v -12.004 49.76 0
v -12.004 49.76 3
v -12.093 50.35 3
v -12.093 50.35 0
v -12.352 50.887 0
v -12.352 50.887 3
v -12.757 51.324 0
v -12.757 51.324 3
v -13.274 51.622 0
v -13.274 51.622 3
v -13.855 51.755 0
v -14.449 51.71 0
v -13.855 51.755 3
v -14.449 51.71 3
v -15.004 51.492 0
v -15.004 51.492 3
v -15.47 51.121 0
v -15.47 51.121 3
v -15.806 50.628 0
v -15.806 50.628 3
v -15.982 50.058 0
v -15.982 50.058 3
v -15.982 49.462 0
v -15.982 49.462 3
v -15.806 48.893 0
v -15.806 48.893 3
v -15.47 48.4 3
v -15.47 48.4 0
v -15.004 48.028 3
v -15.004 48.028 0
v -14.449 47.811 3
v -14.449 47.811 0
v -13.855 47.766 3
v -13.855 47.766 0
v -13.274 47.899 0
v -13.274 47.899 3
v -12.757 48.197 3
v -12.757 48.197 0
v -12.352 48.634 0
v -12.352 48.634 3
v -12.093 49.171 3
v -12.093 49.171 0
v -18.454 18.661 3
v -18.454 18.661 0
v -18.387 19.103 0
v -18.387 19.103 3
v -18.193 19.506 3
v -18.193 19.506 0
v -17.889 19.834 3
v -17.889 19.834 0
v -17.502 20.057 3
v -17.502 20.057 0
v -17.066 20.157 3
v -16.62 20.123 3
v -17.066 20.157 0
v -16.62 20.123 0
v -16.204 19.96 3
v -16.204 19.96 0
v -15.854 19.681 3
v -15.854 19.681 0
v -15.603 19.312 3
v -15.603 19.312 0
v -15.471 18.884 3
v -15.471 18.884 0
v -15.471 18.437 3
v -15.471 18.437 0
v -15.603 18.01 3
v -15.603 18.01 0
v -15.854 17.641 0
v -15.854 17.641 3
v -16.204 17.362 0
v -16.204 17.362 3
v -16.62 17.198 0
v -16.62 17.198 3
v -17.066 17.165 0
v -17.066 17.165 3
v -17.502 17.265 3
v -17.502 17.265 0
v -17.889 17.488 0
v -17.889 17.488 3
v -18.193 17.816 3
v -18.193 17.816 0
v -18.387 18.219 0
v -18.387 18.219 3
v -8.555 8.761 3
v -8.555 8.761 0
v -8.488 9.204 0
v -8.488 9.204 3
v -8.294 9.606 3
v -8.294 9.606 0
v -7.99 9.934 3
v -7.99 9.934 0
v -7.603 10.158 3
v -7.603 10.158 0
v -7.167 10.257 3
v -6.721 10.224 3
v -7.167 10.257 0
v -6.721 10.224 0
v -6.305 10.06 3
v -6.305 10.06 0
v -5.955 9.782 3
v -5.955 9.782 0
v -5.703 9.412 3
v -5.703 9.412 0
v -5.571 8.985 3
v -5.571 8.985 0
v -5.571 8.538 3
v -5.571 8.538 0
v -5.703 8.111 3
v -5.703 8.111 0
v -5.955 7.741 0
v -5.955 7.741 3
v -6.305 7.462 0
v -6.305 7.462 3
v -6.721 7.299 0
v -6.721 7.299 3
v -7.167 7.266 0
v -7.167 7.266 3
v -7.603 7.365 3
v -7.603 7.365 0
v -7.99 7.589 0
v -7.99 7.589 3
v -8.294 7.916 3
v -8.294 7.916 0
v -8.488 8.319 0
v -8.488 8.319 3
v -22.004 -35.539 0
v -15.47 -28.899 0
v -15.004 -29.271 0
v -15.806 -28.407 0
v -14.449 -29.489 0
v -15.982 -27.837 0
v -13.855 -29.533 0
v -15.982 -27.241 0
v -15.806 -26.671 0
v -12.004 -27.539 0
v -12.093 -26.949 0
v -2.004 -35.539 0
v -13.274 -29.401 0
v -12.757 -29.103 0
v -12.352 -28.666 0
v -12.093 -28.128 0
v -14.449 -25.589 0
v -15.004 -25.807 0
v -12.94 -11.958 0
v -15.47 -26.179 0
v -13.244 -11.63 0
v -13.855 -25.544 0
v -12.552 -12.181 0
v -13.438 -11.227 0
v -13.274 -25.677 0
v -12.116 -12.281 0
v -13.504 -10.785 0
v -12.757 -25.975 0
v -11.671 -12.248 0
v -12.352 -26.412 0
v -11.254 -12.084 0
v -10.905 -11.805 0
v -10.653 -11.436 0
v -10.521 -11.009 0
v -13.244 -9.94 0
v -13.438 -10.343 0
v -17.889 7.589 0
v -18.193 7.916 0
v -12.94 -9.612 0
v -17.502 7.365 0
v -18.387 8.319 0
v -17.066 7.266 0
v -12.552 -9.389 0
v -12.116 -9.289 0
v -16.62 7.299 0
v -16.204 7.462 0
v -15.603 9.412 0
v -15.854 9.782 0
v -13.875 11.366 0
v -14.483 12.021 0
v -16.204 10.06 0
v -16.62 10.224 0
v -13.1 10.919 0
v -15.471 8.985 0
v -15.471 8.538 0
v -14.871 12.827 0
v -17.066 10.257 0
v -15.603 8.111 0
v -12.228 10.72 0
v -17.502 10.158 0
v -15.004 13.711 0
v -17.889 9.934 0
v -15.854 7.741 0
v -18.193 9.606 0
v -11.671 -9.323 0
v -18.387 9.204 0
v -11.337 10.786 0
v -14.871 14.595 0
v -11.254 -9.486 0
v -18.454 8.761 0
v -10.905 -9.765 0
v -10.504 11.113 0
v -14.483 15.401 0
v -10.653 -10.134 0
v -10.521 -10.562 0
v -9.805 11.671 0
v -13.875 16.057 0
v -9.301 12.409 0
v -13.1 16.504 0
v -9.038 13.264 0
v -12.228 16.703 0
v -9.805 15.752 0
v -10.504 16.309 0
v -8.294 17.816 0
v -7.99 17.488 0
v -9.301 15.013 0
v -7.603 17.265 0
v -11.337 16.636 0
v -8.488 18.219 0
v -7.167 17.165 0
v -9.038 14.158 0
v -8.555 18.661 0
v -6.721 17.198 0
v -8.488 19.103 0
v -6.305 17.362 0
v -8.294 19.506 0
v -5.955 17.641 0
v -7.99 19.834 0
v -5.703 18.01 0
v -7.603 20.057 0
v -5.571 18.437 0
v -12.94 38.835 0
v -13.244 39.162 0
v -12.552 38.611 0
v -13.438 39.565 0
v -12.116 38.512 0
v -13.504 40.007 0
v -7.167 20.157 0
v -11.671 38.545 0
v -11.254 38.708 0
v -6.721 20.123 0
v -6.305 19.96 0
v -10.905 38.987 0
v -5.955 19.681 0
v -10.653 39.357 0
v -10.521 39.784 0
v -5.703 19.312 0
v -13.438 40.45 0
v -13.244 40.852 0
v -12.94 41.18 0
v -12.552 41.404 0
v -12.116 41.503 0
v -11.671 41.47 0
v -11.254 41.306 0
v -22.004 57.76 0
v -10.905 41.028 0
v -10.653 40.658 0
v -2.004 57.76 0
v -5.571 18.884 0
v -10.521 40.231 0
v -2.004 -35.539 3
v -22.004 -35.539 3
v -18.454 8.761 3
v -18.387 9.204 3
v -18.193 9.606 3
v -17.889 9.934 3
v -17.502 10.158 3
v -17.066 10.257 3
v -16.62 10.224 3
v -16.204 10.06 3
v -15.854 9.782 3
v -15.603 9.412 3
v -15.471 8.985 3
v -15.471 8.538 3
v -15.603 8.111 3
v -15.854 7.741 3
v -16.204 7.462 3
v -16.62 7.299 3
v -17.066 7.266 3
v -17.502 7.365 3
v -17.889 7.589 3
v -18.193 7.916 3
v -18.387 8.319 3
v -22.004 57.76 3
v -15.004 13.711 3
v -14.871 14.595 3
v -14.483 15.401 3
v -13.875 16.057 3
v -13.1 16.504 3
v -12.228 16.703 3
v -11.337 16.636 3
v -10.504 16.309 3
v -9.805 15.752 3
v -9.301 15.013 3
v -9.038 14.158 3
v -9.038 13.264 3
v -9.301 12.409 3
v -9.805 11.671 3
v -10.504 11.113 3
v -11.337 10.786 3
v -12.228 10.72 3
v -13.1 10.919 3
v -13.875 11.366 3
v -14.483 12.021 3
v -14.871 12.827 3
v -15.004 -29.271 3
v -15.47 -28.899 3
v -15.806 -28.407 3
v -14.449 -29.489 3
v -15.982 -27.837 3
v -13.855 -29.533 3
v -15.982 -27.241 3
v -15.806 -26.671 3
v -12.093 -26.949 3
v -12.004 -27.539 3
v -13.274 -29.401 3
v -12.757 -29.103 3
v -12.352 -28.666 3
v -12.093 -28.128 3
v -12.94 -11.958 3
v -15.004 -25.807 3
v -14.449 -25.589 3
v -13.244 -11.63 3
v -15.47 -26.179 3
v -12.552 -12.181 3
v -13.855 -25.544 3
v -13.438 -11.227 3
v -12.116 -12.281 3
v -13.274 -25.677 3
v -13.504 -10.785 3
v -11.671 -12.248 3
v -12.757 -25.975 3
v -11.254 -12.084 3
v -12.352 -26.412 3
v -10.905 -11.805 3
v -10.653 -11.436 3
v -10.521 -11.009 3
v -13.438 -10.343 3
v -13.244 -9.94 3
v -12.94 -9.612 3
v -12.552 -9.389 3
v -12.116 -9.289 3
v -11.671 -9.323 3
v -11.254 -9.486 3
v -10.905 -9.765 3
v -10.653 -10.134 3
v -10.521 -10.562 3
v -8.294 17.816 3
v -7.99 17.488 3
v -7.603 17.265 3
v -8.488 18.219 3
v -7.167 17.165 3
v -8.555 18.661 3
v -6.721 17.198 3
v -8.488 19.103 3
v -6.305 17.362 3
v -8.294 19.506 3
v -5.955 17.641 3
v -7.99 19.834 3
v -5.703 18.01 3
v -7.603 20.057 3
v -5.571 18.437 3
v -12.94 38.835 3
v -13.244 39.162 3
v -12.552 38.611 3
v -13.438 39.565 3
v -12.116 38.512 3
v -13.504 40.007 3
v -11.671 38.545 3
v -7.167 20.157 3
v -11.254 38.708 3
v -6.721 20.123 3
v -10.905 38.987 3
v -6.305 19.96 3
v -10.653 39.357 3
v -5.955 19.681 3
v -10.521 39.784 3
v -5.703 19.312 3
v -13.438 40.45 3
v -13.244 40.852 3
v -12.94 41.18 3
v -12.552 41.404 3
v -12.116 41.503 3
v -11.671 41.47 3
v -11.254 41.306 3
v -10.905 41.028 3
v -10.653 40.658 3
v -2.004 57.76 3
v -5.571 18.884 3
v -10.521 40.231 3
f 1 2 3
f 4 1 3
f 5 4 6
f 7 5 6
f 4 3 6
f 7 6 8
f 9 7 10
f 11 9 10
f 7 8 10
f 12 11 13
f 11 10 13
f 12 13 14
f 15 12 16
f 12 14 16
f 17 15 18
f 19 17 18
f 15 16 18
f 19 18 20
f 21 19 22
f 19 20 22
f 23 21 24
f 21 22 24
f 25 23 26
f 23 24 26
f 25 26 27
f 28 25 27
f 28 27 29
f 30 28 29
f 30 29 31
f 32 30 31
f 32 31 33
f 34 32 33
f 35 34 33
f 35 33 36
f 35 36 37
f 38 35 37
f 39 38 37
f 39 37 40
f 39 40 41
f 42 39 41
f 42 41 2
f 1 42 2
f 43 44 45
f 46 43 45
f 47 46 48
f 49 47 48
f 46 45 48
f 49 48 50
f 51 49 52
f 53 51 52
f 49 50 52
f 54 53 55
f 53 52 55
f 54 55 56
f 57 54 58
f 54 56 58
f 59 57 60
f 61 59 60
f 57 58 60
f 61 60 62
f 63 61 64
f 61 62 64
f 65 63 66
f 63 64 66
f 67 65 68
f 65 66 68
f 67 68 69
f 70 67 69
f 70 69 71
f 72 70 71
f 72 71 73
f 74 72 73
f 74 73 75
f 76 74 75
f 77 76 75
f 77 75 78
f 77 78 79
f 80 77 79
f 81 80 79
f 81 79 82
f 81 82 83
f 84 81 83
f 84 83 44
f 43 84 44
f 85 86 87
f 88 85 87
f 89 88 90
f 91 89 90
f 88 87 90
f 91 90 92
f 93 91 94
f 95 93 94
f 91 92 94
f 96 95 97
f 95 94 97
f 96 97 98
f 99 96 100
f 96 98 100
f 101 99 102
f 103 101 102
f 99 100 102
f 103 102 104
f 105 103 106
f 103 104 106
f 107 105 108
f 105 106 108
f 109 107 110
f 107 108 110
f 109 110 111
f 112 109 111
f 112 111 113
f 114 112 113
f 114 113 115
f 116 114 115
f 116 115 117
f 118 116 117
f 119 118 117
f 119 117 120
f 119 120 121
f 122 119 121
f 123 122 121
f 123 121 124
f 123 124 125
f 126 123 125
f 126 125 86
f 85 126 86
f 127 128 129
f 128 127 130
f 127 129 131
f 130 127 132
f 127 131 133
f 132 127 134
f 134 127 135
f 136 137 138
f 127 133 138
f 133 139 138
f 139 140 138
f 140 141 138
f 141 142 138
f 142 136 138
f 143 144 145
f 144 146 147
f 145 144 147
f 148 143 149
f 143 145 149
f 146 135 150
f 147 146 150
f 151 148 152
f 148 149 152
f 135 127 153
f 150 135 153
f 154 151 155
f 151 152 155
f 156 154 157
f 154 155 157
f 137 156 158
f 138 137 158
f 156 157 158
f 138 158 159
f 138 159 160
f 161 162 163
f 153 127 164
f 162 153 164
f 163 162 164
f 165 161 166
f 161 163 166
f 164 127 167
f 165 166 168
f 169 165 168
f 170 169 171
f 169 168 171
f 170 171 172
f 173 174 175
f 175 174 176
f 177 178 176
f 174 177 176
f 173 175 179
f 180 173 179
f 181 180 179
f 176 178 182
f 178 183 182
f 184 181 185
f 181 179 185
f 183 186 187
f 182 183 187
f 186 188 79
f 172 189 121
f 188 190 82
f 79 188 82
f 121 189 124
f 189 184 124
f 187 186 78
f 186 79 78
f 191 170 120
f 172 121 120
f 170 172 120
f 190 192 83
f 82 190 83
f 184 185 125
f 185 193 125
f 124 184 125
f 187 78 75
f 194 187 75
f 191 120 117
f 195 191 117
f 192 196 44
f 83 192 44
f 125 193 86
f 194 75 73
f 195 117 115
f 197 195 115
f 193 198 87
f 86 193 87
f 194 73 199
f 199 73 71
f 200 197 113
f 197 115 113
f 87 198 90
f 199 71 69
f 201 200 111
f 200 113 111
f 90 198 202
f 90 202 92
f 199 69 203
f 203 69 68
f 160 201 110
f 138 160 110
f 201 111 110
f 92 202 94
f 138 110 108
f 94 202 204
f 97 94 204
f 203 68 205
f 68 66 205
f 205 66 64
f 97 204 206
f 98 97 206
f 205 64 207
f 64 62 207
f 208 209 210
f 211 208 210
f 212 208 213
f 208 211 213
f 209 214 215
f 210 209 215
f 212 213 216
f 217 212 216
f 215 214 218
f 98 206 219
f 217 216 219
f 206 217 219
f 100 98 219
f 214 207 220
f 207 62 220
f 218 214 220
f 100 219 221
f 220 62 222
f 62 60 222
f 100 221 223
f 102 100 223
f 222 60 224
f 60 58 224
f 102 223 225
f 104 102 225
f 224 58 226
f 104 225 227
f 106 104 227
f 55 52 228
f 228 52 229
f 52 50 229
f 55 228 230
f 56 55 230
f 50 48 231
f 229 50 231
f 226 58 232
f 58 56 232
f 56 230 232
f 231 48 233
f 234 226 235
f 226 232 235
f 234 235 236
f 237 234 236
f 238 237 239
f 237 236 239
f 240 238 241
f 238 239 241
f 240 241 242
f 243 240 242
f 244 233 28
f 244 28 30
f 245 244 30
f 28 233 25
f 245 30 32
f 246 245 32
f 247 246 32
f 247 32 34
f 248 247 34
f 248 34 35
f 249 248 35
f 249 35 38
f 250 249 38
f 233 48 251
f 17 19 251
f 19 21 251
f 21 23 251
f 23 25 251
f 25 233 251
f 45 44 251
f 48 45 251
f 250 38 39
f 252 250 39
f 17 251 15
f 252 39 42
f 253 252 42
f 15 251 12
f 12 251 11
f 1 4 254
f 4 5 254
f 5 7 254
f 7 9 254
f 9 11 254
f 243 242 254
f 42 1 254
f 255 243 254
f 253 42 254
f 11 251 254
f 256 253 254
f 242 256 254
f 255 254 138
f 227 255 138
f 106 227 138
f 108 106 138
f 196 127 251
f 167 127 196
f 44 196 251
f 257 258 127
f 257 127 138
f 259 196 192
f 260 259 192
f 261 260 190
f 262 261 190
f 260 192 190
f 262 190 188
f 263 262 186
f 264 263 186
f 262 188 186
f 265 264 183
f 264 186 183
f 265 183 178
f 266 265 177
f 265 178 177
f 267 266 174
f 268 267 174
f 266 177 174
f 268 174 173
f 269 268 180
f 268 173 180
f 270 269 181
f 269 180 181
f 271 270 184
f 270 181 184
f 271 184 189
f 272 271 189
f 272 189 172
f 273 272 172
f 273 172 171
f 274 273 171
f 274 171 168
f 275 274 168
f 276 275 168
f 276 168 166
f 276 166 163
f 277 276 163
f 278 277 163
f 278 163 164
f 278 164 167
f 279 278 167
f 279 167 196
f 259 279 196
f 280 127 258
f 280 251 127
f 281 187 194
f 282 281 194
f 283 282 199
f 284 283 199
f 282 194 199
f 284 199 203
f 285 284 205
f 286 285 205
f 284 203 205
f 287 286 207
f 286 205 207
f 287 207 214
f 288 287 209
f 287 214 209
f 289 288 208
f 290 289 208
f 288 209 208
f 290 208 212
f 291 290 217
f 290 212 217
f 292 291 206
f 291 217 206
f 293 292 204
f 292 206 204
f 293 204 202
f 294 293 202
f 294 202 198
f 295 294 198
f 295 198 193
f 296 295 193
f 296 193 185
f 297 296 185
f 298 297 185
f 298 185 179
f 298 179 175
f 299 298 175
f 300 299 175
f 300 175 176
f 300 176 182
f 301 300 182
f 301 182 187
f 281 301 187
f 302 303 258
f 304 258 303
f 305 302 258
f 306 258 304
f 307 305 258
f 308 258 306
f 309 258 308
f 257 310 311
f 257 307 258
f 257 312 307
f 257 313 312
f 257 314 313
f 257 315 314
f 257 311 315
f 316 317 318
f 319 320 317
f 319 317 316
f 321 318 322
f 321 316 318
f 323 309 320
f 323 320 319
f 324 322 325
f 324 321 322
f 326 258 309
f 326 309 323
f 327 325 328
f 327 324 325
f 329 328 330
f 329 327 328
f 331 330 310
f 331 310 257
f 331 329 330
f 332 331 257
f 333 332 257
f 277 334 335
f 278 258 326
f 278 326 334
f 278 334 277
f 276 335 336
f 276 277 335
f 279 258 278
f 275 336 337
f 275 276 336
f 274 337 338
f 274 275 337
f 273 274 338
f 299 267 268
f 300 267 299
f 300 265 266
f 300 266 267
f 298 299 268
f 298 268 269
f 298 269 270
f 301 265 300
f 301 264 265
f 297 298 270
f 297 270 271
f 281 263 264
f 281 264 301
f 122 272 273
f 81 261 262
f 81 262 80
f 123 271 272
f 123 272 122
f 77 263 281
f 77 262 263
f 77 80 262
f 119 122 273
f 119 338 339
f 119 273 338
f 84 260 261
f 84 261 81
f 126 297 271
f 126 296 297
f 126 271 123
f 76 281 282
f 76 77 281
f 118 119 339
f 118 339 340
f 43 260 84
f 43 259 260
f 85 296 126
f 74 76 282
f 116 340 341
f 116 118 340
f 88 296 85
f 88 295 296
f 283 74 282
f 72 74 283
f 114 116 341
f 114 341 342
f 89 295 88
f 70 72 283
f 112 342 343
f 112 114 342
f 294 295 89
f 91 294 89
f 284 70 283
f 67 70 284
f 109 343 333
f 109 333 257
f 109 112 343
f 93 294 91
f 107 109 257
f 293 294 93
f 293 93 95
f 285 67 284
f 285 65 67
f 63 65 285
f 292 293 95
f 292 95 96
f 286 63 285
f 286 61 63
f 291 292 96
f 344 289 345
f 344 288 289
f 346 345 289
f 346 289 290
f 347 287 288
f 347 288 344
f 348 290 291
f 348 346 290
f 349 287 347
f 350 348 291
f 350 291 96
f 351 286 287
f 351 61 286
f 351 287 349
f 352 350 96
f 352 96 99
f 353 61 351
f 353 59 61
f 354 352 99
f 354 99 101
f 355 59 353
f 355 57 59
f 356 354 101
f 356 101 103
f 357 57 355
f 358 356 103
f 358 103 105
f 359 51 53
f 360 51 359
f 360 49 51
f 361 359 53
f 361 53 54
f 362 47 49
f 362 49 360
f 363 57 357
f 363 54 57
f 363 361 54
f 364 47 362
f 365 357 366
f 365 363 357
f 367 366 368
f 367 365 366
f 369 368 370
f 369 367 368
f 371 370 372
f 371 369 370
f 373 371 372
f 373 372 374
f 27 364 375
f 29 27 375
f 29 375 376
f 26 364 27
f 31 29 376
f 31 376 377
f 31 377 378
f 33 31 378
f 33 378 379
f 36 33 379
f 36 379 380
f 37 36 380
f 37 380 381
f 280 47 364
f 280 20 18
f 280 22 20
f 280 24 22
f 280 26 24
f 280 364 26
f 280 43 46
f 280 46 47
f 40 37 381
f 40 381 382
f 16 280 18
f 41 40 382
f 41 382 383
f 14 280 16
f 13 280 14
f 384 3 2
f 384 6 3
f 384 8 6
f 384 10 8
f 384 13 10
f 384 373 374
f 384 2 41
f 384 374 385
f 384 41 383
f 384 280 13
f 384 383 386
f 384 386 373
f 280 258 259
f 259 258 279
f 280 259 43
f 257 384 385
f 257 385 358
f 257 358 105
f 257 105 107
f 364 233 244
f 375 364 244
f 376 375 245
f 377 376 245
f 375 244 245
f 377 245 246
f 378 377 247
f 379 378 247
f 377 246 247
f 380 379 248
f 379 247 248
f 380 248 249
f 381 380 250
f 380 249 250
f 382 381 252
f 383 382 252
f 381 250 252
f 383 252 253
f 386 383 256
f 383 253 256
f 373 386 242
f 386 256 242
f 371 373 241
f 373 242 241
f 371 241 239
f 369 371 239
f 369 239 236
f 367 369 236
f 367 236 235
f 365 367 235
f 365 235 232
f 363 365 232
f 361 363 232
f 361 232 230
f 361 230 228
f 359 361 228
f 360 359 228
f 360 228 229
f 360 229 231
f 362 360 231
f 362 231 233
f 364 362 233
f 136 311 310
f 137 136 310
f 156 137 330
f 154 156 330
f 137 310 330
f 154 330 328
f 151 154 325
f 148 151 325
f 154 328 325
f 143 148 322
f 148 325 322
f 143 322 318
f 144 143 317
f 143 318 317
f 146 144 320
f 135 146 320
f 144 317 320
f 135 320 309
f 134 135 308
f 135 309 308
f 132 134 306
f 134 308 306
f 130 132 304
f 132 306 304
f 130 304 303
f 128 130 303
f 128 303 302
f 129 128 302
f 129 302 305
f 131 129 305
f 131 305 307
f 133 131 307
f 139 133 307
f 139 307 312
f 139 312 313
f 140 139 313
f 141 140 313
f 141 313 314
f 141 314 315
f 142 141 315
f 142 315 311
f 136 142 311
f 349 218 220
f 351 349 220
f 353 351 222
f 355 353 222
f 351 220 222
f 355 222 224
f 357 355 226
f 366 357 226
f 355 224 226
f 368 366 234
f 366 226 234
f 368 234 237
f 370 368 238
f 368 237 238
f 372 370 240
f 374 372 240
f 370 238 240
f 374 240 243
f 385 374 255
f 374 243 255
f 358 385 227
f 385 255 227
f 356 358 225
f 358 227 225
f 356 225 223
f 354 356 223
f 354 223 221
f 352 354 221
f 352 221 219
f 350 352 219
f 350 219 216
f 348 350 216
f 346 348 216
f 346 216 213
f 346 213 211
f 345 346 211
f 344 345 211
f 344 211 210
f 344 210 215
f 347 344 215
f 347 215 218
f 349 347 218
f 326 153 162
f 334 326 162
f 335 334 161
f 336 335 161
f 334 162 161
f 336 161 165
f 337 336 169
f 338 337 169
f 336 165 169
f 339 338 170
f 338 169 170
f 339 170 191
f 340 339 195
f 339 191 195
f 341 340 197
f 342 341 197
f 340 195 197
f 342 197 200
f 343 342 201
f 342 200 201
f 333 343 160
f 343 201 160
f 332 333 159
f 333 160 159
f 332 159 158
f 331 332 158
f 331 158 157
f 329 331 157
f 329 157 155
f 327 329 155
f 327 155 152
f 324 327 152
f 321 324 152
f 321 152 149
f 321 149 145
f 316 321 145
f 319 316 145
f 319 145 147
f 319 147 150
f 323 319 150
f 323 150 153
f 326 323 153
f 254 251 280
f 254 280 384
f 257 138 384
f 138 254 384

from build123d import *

# Parameters (mm, degrees)
SKETCH_1_W           = 170.943732818
SKETCH_1_H           = 105.520822726
EXTRUDE_1_DEPTH      = 3
SKETCH_3_OUTSIDE_W   = 213.126
SKETCH_3_OUTSIDE_H   = 147.702
SKETCH_3_OUTSIDE_W_2 = 20
SKETCH_3_OUTSIDE_H_2 = 88.50002898
CUT_EXTRUDE_1_DEPTH  = 101.489307663
SKETCH_2_R           = 1.5
SKETCH_2_R_2         = 3
CUT_EXTRUDE_2_DEPTH  = 58.243779886
SKETCH_4_R           = 1.5
CUT_EXTRUDE_3_DEPTH  = 58.243779886
SKETCH_9_W           = 20
SKETCH_9_H           = 3
EXTRUDE_3_DEPTH      = 5
SKETCH_10_W          = 20
SKETCH_10_H          = 3
EXTRUDE_4_DEPTH      = 5
SKETCH_11_R          = 2
CUT_EXTRUDE_4_DEPTH  = 5


with BuildPart() as part:
    # 草图1 → 凸台-拉伸1 (new body)
    with BuildSketch(Plane.XY):
        Rectangle(SKETCH_1_W, SKETCH_1_H)
    extrude(amount=EXTRUDE_1_DEPTH)

    # 草图3 outside → 切除-拉伸1 (cut, through all)
    with BuildSketch(Plane.XY.offset(3)):
        Rectangle(SKETCH_3_OUTSIDE_W, SKETCH_3_OUTSIDE_H)
        with Locations((-12.004302498, 13.711132511)):
            Rectangle(SKETCH_3_OUTSIDE_W_2, SKETCH_3_OUTSIDE_H_2, mode=Mode.SUBTRACT)
    extrude(amount=-CUT_EXTRUDE_1_DEPTH, mode=Mode.SUBTRACT)

    # 草图2 → 切除-拉伸2 (cut, through all)
    with BuildSketch(Plane(origin=(0, 0, 0), x_dir=(-1, 0, 0), z_dir=(0, 0, -1))):
        with Locations((7.05455503, 18.660879979)):
            Circle(SKETCH_2_R)
        with Locations((16.954049967, 18.660879979)):
            Circle(SKETCH_2_R)
        with Locations((16.954049967, 8.761385043)):
            Circle(SKETCH_2_R)
        with Locations((7.05455503, 8.761385043)):
            Circle(SKETCH_2_R)
        with Locations((12.004302498, 13.711132511)):
            Circle(SKETCH_2_R_2)
    extrude(amount=-CUT_EXTRUDE_2_DEPTH, mode=Mode.SUBTRACT)

    # 草图4 → 切除-拉伸3 (cut, through all)
    with BuildSketch(Plane(origin=(0, 0, 0), x_dir=(-1, 0, 0), z_dir=(0, 0, -1))):
        with Locations((12.004302498, 40.007436866)):
            Circle(SKETCH_4_R)
        with Locations((12.004302498, -10.785171844)):
            Circle(SKETCH_4_R)
    extrude(amount=-CUT_EXTRUDE_3_DEPTH, mode=Mode.SUBTRACT)

    # 草图9 → 凸台-拉伸3 (add)
    with BuildSketch(Plane(origin=(0, 52.760411363, 0), x_dir=(1, 0, 0), z_dir=(0, 1, 0))):
        with Locations((-12.004302498, -1.5)):
            Rectangle(SKETCH_9_W, SKETCH_9_H)
    extrude(amount=EXTRUDE_3_DEPTH)

    # 草图10 → 凸台-拉伸4 (add)
    with BuildSketch(Plane.XZ.offset(30.538881979)):
        with Locations((-12.004302498, 1.5)):
            Rectangle(SKETCH_10_W, SKETCH_10_H)
    extrude(amount=EXTRUDE_4_DEPTH)

    # 草图11 → 切除-拉伸4 (cut)
    with BuildSketch(Plane.XY.offset(3)):
        with Locations((-14.004302498, 49.760411363)):
            Circle(SKETCH_11_R)
        with Locations((-14.004302498, -27.538881979)):
            Circle(SKETCH_11_R)
    extrude(amount=-CUT_EXTRUDE_4_DEPTH, mode=Mode.SUBTRACT)


solid = part.part
